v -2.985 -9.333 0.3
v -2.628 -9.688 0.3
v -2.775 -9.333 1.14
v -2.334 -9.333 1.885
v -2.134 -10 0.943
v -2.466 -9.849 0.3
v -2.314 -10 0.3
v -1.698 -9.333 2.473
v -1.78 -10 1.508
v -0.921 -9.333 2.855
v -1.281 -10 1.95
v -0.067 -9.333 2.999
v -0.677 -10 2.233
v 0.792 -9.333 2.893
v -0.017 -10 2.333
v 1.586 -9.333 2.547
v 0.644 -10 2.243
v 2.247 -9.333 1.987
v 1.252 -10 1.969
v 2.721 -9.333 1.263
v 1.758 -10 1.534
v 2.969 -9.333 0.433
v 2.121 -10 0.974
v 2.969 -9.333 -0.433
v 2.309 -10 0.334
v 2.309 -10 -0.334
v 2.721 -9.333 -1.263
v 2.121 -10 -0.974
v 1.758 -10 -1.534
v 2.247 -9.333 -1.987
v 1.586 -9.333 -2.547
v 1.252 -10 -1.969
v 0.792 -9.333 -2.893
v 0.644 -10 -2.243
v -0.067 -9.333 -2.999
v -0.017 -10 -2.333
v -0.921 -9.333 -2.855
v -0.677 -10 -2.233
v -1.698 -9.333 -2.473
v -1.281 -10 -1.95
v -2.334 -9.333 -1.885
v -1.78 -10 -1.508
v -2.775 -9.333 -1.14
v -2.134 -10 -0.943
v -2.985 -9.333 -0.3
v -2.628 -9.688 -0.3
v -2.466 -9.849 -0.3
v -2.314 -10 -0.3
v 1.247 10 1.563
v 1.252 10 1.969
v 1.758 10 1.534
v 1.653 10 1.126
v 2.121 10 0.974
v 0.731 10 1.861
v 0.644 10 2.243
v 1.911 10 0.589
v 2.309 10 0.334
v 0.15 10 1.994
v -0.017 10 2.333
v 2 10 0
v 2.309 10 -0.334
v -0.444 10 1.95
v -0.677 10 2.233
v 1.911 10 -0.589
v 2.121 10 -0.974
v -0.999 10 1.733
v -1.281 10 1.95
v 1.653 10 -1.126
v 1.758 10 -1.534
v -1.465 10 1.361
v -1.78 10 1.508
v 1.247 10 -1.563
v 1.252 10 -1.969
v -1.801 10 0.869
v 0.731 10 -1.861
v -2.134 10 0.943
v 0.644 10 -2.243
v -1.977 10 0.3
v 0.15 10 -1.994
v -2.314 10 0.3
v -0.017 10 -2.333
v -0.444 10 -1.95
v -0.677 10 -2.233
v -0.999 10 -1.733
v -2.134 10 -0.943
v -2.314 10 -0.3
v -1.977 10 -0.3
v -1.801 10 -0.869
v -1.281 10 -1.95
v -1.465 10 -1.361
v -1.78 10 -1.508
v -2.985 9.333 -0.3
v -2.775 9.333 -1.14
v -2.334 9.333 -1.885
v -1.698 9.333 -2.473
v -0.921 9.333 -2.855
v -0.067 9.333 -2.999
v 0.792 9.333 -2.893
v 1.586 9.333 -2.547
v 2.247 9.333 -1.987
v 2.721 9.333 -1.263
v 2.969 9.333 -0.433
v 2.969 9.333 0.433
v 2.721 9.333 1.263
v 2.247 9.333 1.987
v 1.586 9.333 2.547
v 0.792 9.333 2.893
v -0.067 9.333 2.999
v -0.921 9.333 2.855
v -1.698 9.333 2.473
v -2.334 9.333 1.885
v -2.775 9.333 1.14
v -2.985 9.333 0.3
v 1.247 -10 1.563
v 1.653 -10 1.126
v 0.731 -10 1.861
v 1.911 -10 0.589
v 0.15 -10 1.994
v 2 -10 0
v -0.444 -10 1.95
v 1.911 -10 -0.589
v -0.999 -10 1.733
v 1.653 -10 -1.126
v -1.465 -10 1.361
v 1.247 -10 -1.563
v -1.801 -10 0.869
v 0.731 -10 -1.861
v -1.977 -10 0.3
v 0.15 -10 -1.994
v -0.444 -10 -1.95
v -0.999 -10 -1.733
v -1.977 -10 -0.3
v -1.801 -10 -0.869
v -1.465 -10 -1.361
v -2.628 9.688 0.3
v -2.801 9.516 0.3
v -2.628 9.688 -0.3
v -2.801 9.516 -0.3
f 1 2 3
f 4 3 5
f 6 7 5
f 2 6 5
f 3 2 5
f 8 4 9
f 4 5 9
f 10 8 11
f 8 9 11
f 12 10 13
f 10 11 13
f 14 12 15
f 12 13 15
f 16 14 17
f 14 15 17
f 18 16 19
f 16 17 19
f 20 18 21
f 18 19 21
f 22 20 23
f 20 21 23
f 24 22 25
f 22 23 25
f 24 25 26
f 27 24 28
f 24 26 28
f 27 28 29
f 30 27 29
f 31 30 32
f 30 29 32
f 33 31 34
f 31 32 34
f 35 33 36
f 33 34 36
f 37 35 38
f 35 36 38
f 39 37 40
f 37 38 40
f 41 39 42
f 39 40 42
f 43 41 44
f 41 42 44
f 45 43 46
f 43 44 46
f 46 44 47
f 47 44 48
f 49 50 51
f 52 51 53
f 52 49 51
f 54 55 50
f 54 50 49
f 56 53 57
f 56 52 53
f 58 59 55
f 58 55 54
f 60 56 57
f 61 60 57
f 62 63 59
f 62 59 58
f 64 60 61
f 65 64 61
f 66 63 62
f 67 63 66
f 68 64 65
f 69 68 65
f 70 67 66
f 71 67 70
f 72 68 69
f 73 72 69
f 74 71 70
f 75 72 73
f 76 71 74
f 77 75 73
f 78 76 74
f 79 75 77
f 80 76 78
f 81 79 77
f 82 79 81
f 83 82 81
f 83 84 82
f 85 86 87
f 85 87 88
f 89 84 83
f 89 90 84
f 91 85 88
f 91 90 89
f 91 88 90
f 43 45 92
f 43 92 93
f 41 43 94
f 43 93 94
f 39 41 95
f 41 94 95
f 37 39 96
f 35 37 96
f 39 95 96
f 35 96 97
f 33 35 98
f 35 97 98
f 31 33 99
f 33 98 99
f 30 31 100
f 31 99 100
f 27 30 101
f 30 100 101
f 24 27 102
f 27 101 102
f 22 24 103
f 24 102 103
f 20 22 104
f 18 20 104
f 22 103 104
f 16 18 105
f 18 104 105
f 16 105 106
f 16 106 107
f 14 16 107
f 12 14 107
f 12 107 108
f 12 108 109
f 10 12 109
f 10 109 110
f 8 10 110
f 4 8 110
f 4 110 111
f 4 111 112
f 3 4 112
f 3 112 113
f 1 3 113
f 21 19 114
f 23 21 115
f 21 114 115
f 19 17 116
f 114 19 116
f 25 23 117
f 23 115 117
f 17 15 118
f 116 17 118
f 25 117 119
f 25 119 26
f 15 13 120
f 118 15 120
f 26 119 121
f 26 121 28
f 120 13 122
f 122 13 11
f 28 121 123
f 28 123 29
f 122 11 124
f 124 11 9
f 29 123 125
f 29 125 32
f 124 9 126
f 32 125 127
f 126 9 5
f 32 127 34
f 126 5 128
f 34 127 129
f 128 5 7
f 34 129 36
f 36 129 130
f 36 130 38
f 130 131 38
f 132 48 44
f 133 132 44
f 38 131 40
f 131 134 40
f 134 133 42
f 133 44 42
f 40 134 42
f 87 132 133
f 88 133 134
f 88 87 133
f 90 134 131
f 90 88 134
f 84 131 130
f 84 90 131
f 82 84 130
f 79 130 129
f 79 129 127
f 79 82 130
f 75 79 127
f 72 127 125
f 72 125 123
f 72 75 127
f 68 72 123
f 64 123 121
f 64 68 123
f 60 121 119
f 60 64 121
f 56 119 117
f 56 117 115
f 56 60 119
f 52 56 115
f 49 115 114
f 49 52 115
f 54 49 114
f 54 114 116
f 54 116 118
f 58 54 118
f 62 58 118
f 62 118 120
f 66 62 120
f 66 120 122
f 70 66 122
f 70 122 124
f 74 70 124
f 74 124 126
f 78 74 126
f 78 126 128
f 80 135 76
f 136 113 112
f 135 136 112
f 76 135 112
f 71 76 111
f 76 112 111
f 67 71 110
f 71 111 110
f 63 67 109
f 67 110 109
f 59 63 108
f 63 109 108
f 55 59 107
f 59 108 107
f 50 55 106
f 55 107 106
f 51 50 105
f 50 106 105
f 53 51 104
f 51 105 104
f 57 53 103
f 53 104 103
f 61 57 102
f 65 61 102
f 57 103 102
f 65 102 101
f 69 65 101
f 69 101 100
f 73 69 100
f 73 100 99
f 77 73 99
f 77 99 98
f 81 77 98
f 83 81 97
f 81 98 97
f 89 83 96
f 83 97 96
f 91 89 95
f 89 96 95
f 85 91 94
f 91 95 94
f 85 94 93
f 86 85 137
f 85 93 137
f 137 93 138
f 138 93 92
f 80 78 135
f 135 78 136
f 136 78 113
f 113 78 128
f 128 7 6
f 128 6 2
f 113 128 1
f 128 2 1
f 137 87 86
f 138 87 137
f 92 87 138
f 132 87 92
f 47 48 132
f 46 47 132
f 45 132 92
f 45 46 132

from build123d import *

# Parameters (mm, degrees)
ESQUISSE1_W                  = 1
ESQUISSE1_H                  = 20
ENL_V_MAT_EXTRU_1_DEPTH      = 11.862780491
ENL_V_MAT_EXTRU_1_DEPTH_BACK = 11.862780491
ESQUISSE2_W                  = 3
ESQUISSE2_H                  = 0.6


with BuildPart() as part:
    # Esquisse1 → Base-Révolution (revolve)
    with BuildSketch(Plane.XY, mode=Mode.PRIVATE) as base_r_volution_sk:
        with Locations((2.5, 0)):
            Rectangle(ESQUISSE1_W, ESQUISSE1_H)
    revolve(base_r_volution_sk.sketch.rotate(Axis((0, 10, 0), (0, -1, 0)), 90), axis=Axis((0, 10, 0), (0, -1, 0)))

    # Chanfrein1: read off the stored shape, not the designer's step
    # Chanfrein1 outline → Chanfrein1 (revolve, cut)
    with BuildSketch(Plane.XY):
        Polygon((3, 10), (2.333333333, 10), (3, 9.333333333), align=None)
        Polygon((3, -10), (3, -9.333333333), (2.333333333, -10), align=None)
    revolve(axis=Axis((0, 0, 0), (0, 1, 0)), mode=Mode.SUBTRACT)

    # Esquisse2 → Enlèv. mat.-Extru.1 (cut, two sides: drawn at the far end of the back side and taken through both)
    with BuildSketch(Plane(origin=(0, 0, 0), x_dir=(-1, 0, 0), z_dir=(0, 1, 0)).offset(-ENL_V_MAT_EXTRU_1_DEPTH_BACK)):
        with Locations((1.5, 0)):
            Rectangle(ESQUISSE2_W, ESQUISSE2_H)
    extrude(amount=ENL_V_MAT_EXTRU_1_DEPTH + ENL_V_MAT_EXTRU_1_DEPTH_BACK, mode=Mode.SUBTRACT)


solid = part.part
